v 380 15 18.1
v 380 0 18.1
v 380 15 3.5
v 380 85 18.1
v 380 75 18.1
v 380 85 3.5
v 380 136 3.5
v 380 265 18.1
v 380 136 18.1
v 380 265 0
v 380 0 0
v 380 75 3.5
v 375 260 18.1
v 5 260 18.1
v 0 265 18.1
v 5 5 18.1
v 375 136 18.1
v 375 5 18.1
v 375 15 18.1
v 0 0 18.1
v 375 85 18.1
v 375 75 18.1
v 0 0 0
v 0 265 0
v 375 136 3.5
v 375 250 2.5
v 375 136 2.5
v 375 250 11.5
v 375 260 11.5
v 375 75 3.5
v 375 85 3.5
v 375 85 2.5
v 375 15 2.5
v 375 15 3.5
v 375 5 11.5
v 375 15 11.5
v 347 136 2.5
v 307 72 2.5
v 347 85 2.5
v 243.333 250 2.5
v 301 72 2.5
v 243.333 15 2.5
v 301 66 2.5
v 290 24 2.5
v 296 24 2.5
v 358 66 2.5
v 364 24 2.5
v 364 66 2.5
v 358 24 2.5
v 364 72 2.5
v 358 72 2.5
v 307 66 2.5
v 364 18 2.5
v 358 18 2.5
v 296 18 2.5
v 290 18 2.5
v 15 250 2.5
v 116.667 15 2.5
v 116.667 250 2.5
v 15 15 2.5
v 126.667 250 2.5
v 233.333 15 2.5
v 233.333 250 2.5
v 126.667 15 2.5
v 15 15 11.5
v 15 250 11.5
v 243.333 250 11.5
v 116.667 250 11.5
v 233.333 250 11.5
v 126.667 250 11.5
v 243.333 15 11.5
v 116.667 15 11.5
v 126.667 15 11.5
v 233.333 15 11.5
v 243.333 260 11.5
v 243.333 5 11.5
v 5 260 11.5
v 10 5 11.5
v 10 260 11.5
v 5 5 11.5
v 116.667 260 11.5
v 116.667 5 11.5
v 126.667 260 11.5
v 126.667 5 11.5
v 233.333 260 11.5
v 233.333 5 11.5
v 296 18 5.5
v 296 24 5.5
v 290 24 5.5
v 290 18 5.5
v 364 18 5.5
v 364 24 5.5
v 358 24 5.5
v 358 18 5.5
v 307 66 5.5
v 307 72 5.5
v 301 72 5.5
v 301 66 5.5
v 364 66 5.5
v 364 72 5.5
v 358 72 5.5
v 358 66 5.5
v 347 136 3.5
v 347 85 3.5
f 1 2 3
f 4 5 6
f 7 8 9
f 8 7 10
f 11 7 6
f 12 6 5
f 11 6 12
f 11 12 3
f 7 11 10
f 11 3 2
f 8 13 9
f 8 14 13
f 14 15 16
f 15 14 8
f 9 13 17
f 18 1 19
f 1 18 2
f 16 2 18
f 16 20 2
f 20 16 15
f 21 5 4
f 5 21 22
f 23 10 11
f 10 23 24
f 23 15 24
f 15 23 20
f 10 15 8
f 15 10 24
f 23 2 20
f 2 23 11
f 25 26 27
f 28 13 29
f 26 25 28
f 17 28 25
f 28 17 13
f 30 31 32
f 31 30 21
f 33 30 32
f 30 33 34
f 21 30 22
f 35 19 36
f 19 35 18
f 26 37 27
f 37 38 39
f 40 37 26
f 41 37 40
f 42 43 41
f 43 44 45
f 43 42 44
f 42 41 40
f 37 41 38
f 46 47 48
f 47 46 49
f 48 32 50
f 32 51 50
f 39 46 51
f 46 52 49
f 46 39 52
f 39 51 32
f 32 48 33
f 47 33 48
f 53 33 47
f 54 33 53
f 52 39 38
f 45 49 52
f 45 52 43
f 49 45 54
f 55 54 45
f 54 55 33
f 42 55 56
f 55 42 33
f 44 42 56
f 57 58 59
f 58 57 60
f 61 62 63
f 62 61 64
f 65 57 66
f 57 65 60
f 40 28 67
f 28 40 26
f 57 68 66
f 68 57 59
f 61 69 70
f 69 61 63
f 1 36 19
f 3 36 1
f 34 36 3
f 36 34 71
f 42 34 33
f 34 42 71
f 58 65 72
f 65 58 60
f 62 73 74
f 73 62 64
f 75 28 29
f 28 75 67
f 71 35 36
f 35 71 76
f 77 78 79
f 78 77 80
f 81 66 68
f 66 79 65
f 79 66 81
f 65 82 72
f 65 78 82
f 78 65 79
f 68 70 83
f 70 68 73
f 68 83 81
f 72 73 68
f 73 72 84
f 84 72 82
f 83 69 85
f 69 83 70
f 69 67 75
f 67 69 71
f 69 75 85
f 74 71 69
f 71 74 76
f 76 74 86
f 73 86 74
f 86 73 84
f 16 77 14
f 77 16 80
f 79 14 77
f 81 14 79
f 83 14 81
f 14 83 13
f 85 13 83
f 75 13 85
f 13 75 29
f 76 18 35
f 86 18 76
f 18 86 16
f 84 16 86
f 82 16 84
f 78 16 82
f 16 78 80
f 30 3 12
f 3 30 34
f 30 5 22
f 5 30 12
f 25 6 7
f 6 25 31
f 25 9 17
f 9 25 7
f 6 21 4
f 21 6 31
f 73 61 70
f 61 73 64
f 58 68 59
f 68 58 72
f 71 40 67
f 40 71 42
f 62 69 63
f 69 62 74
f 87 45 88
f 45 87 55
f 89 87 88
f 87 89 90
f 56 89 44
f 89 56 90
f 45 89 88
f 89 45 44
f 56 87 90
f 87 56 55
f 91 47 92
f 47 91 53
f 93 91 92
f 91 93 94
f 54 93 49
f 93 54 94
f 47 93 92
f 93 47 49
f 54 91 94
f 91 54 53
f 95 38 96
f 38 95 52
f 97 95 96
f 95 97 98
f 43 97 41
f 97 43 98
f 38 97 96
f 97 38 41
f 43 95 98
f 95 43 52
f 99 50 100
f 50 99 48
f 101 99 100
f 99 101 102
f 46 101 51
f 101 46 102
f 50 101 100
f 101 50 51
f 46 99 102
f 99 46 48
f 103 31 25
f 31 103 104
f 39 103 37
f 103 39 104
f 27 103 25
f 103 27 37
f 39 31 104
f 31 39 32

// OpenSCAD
// MonitorCow - CTCL 2024
// File: monitorcow-n156kme-gna_mdf.scad
// Purpose: Case design, optimized for wood carving
// Created: October 18, 2024
// Modified: November 8, 2024

// Units - mm
// X - Width
// Y - Length
// Z - Height

// Accepted values:
// "base" - Everything else
// "lcdmount" - Display mount
// "lcdcover" - Display cover layer
// "all" - Show everything
// "allexp" - Show everything, exploded view
show = "base";
exp_dist = 75;

// Dimensions
// 215mm display + 10mm display PCB area + 10mm for cable ; 2.6mm for display + 2mm double-sided tape
lcd_dims = [350, 215 + 10 + 10, 2.6 + 2];
// Distance between connector middle and the outer right side of the display
lcd_conn_from_right = 120;
// Distances between the outer dimension of the lens to the LCD active area
lcd_aa_dist_right = 2.5;
lcd_aa_dist_left = 2.5;
lcd_aa_dist_bottom = 17 + 7;
lcd_aa_dist_top = 2.5;

case_bottom_height = 2.5;
// Distance between the case bottom layer and the bottom of the display mount
case_internal_height = 9;

// Walls that the display mount rests on
case_inner_wall_width = 10;

// Outer structural wall of the case
// WARNING: This variable changes the size of the case
case_outer_wall_width = 5;
// Size of the posts that the display mount bolts to
// WARNING: This variable changes the size of the case and LCD mount
case_post_size = 10;

disp_edge_width = case_post_size;
disp_cover_height = 2;
disp_base_height = 2;
disp_conn_cutout_width = 30;
disp_conn_cutout_length = 50;

// PCB parameters
pcb_width = 60;
pcb_length = 102;
pcb_thickness = 1;

// PCB mounting hole offsets
pcb_mount_tl = [23,-3];
pcb_mount_tr = [-16,-3];
pcb_mount_bl = [12,3];
pcb_mount_br = [-16,3];

// Button PCB parameters
pcb2_width = 51;
pcb2_length = 28;

// Distance between PCBs
pcb_sep_dist = 10;

// Standoff parameters
// length of both sides
pcb_standoff_base_size = 6;
pcb_standoff_height = 3;
pcb_standoff_od = 4;

case_mount_standoff_height = 3;
case_mount_standoff_od = 4.5;

// Bolt diameter + tolerance
bolt_dia = 3 + 0.6;

// Support count
support_width = case_inner_wall_width;
disp_y_axis_supports = 2;

// == Variable Assignment Section ==
// Height of the mount part
lcd_mount_height = disp_base_height + lcd_dims[2];

box_height = case_bottom_height + case_internal_height + lcd_mount_height;
box_width = lcd_dims[0] + (case_post_size * 2) + (case_outer_wall_width * 2);
box_length = lcd_dims[1] + (case_post_size * 2) + (case_outer_wall_width * 2);

// Total size of the case
box_dims = [box_width, box_length, box_height];
// Size of the inside part of the box without display rest walls
box_total_inner_size = [lcd_dims[0] + (case_post_size * 2), lcd_dims[1] + (case_post_size * 2), box_height];
// Size of the inside part of the box with display rest walls
// No wall right due to IO
box_inner_size = [lcd_dims[0] + ((case_post_size * 2) - case_inner_wall_width), lcd_dims[1] + ((case_post_size * 2) - (case_inner_wall_width * 2)), box_height];

// 3D size of posts
post_dims = [case_post_size, case_post_size, case_internal_height];

// Case bolt center locations
case_bolt_centers = [
    [case_outer_wall_width, case_outer_wall_width, case_bottom_height] + [(case_post_size / 2), (case_post_size / 2), post_dims[2] - case_mount_standoff_od],
    [case_outer_wall_width + box_total_inner_size[0] - case_post_size, case_outer_wall_width, case_bottom_height] + [(case_post_size / 2), (case_post_size / 2), post_dims[2] - case_mount_standoff_od],
    [case_outer_wall_width, case_outer_wall_width + box_total_inner_size[1] - case_post_size, case_bottom_height] + [(case_post_size / 2), (case_post_size / 2), post_dims[2] - case_mount_standoff_od],
    [case_outer_wall_width + box_total_inner_size[0] - case_post_size, case_outer_wall_width + box_total_inner_size[1] - case_post_size, case_bottom_height] + [(case_post_size / 2), (case_post_size / 2), post_dims[2] - case_mount_standoff_od]
];

// == Object Drawing Section ==
module base() {
    module standoff() {
        translate([0, 0, 0]) {
            difference() {
                cube([pcb_standoff_base_size, pcb_standoff_base_size, pcb_standoff_height]);
//                translate([(pcb_standoff_base_size / 2), (pcb_standoff_base_size / 2), -1]) { 
//                    cylinder(r=pcb_standoff_od / 2, h=pcb_standoff_od + 2, $fn=6);
//                }
            }
        }
    }
    difference() {
        union() {
            difference() {
                cube(box_dims);
                // Cutout for internals
                translate([case_outer_wall_width + case_inner_wall_width, case_outer_wall_width + case_inner_wall_width, case_bottom_height]) {
                    cube(box_inner_size);
                }
                // Cutout for display mount
                translate([case_outer_wall_width, case_outer_wall_width, case_bottom_height + case_internal_height]) {
                    cube([lcd_dims[0] + (case_post_size * 2), lcd_dims[1] + (case_post_size * 2), box_height]);
                }
            }
            // With 0 Y = Bottom, 0 X = Left
            // Bottom Left Post
            //translate([case_outer_wall_width, case_outer_wall_width, case_bottom_height]) {
            //    cube(post_dims);
            //}
            // Bottom Right Post
            //translate([case_outer_wall_width + box_total_inner_size[0] - case_post_size, case_outer_wall_width, case_bottom_height]) {
            //    cube(post_dims);
            //}
            // Top Left Post
            //translate([case_outer_wall_width, case_outer_wall_width + box_total_inner_size[1] - case_post_size, case_bottom_height]) {
            //    cube(post_dims);
            //}
            // Top Right Post
            //translate([case_outer_wall_width + box_total_inner_size[0] - case_post_size, case_outer_wall_width + box_total_inner_size[1] - case_post_size, case_bottom_height]) {
            //    cube(post_dims);
            //}
        }
        // PCB connector cutout
        translate([box_dims[0] - case_outer_wall_width - 1, case_outer_wall_width + case_post_size, case_bottom_height + pcb_standoff_height - 2]) {
            cube([case_outer_wall_width + 2,pcb_width,20]);
        }
        // Button PCB cutout
        translate([box_dims[0] - case_outer_wall_width - 1, case_outer_wall_width + case_post_size + pcb_width + pcb_sep_dist, case_bottom_height + pcb_standoff_height - 2]) {
            cube([case_outer_wall_width + 2,pcb2_width,20]);
        }
    }
    // Supports
    if (disp_y_axis_supports > 0) {
        for (a =[0:disp_y_axis_supports]) {
            
            translate([(((box_dims[0] / (disp_y_axis_supports + 1))) - support_width) * a,0,case_bottom_height]) {
                cube([support_width,box_dims[1],case_internal_height]);
            }
        }
    }
    // PCB standoffs
    // Subtracting x by "case_outer_wall_width" is omitted from the following to have the connectors somewhat flush with the side of the case
    translate([box_dims[0] - pcb_length, case_outer_wall_width + case_post_size, case_bottom_height]) {
        // Bottom Left
        translate([0, 0, 0] + pcb_mount_bl) {
            standoff();
        }
        // Bottom Right
        translate([pcb_length - pcb_standoff_base_size, 0, 0] + pcb_mount_br) {
            standoff();
        }
        // Top Left
        translate([0, pcb_width - pcb_standoff_base_size, 0] + pcb_mount_tl) {
            standoff();
        }
        // Top Right
        translate([pcb_length - pcb_standoff_base_size, pcb_width - pcb_standoff_base_size, 0] + pcb_mount_tr) {
            standoff();
        }
    } 
    
    // Button PCB standoff
    // It is a flat platform as the button panel would be double-sided-taped to the case instead of using bolt mounts due to its small size
    translate([box_dims[0] - case_outer_wall_width - pcb2_length, case_outer_wall_width + case_post_size + pcb_width + pcb_sep_dist, case_bottom_height - 2]) {
        cube([pcb2_length, pcb2_width, pcb_standoff_height]);
    }    
}

module lcdmount() {
    difference() {
        translate([case_outer_wall_width, case_outer_wall_width, 0]) {
            difference() {
                cube([box_total_inner_size[0], box_total_inner_size[1], lcd_mount_height]);
                translate([case_post_size, case_post_size, disp_base_height]) {
                    // Add 1 to prevent z fighting effects
                    cube(lcd_dims + [0,0,1]);
                }
                conn_cutout_dist = 
                    box_total_inner_size[0] - 
                    case_post_size -
                    (lcd_conn_from_right - (disp_conn_cutout_width / 2));
                
                // Once again add -1 to height for z fighting
                translate([conn_cutout_dist, case_post_size, -1]) {
                    // Connector cutout 
                    // Then add back 2mm to height
                    cube([disp_conn_cutout_width, disp_conn_cutout_length, disp_base_height + 2]);
                }   
            }
        }
        for (pos = case_bolt_centers) {
            translate([pos[0], pos[1], -1]) {
                cylinder(r = bolt_dia / 2, h = lcd_mount_height + 2, $fn=360);
            }
        }
    }
    
    translate([box_dims[0] - case_outer_wall_width, case_outer_wall_width + case_post_size, 0]) {
        cube([case_outer_wall_width,pcb_width,lcd_mount_height]);
    }
    translate([box_dims[0] - case_outer_wall_width, case_outer_wall_width + case_post_size + pcb_width + pcb_sep_dist, 0]) {
        cube([case_outer_wall_width,pcb2_width,lcd_mount_height]);
    }
}

module lcdcover() {
    difference() {
        cube([box_dims[0], box_dims[1], disp_cover_height]);
        cutout_width = box_dims[0] - (case_post_size * 2) - (case_outer_wall_width * 2) - lcd_aa_dist_right - lcd_aa_dist_left;
        cutout_length = box_dims[1] - (case_post_size * 2) - (case_outer_wall_width * 2) - lcd_aa_dist_top - lcd_aa_dist_bottom;
        left_distance = lcd_aa_dist_left + case_post_size + case_outer_wall_width;
        bottom_distance = lcd_aa_dist_bottom + case_post_size + case_outer_wall_width;
        translate([left_distance, bottom_distance, -1]) {
            cube([cutout_width, cutout_length, disp_cover_height + 2]);
        }
        for (pos = case_bolt_centers) {
            translate([pos[0], pos[1], -1]) {
                cylinder(r = bolt_dia / 2, h = lcd_mount_height + 2, $fn=360);
            }
        }
    }
}




if (show == "base") {
    base();
}

if (show == "lcdmount") {
    lcdmount();
}

if (show == "lcdcover") {
    lcdcover();
}

if (show == "all") {
     base();
    translate([0, 0, case_bottom_height + case_internal_height]) {
        lcdmount();
    }
    translate([0, 0, case_bottom_height + case_internal_height + disp_base_height + lcd_dims[2]]) {
        lcdcover();
    }
}

if (show == "allexp") {
    base();
    translate([0, 0, case_bottom_height + case_internal_height + exp_dist]) {
        lcdmount();
    }
    translate([0, 0, case_bottom_height + case_internal_height + disp_base_height + lcd_dims[2] + (exp_dist * 2)]) {
        lcdcover();
    }
}
